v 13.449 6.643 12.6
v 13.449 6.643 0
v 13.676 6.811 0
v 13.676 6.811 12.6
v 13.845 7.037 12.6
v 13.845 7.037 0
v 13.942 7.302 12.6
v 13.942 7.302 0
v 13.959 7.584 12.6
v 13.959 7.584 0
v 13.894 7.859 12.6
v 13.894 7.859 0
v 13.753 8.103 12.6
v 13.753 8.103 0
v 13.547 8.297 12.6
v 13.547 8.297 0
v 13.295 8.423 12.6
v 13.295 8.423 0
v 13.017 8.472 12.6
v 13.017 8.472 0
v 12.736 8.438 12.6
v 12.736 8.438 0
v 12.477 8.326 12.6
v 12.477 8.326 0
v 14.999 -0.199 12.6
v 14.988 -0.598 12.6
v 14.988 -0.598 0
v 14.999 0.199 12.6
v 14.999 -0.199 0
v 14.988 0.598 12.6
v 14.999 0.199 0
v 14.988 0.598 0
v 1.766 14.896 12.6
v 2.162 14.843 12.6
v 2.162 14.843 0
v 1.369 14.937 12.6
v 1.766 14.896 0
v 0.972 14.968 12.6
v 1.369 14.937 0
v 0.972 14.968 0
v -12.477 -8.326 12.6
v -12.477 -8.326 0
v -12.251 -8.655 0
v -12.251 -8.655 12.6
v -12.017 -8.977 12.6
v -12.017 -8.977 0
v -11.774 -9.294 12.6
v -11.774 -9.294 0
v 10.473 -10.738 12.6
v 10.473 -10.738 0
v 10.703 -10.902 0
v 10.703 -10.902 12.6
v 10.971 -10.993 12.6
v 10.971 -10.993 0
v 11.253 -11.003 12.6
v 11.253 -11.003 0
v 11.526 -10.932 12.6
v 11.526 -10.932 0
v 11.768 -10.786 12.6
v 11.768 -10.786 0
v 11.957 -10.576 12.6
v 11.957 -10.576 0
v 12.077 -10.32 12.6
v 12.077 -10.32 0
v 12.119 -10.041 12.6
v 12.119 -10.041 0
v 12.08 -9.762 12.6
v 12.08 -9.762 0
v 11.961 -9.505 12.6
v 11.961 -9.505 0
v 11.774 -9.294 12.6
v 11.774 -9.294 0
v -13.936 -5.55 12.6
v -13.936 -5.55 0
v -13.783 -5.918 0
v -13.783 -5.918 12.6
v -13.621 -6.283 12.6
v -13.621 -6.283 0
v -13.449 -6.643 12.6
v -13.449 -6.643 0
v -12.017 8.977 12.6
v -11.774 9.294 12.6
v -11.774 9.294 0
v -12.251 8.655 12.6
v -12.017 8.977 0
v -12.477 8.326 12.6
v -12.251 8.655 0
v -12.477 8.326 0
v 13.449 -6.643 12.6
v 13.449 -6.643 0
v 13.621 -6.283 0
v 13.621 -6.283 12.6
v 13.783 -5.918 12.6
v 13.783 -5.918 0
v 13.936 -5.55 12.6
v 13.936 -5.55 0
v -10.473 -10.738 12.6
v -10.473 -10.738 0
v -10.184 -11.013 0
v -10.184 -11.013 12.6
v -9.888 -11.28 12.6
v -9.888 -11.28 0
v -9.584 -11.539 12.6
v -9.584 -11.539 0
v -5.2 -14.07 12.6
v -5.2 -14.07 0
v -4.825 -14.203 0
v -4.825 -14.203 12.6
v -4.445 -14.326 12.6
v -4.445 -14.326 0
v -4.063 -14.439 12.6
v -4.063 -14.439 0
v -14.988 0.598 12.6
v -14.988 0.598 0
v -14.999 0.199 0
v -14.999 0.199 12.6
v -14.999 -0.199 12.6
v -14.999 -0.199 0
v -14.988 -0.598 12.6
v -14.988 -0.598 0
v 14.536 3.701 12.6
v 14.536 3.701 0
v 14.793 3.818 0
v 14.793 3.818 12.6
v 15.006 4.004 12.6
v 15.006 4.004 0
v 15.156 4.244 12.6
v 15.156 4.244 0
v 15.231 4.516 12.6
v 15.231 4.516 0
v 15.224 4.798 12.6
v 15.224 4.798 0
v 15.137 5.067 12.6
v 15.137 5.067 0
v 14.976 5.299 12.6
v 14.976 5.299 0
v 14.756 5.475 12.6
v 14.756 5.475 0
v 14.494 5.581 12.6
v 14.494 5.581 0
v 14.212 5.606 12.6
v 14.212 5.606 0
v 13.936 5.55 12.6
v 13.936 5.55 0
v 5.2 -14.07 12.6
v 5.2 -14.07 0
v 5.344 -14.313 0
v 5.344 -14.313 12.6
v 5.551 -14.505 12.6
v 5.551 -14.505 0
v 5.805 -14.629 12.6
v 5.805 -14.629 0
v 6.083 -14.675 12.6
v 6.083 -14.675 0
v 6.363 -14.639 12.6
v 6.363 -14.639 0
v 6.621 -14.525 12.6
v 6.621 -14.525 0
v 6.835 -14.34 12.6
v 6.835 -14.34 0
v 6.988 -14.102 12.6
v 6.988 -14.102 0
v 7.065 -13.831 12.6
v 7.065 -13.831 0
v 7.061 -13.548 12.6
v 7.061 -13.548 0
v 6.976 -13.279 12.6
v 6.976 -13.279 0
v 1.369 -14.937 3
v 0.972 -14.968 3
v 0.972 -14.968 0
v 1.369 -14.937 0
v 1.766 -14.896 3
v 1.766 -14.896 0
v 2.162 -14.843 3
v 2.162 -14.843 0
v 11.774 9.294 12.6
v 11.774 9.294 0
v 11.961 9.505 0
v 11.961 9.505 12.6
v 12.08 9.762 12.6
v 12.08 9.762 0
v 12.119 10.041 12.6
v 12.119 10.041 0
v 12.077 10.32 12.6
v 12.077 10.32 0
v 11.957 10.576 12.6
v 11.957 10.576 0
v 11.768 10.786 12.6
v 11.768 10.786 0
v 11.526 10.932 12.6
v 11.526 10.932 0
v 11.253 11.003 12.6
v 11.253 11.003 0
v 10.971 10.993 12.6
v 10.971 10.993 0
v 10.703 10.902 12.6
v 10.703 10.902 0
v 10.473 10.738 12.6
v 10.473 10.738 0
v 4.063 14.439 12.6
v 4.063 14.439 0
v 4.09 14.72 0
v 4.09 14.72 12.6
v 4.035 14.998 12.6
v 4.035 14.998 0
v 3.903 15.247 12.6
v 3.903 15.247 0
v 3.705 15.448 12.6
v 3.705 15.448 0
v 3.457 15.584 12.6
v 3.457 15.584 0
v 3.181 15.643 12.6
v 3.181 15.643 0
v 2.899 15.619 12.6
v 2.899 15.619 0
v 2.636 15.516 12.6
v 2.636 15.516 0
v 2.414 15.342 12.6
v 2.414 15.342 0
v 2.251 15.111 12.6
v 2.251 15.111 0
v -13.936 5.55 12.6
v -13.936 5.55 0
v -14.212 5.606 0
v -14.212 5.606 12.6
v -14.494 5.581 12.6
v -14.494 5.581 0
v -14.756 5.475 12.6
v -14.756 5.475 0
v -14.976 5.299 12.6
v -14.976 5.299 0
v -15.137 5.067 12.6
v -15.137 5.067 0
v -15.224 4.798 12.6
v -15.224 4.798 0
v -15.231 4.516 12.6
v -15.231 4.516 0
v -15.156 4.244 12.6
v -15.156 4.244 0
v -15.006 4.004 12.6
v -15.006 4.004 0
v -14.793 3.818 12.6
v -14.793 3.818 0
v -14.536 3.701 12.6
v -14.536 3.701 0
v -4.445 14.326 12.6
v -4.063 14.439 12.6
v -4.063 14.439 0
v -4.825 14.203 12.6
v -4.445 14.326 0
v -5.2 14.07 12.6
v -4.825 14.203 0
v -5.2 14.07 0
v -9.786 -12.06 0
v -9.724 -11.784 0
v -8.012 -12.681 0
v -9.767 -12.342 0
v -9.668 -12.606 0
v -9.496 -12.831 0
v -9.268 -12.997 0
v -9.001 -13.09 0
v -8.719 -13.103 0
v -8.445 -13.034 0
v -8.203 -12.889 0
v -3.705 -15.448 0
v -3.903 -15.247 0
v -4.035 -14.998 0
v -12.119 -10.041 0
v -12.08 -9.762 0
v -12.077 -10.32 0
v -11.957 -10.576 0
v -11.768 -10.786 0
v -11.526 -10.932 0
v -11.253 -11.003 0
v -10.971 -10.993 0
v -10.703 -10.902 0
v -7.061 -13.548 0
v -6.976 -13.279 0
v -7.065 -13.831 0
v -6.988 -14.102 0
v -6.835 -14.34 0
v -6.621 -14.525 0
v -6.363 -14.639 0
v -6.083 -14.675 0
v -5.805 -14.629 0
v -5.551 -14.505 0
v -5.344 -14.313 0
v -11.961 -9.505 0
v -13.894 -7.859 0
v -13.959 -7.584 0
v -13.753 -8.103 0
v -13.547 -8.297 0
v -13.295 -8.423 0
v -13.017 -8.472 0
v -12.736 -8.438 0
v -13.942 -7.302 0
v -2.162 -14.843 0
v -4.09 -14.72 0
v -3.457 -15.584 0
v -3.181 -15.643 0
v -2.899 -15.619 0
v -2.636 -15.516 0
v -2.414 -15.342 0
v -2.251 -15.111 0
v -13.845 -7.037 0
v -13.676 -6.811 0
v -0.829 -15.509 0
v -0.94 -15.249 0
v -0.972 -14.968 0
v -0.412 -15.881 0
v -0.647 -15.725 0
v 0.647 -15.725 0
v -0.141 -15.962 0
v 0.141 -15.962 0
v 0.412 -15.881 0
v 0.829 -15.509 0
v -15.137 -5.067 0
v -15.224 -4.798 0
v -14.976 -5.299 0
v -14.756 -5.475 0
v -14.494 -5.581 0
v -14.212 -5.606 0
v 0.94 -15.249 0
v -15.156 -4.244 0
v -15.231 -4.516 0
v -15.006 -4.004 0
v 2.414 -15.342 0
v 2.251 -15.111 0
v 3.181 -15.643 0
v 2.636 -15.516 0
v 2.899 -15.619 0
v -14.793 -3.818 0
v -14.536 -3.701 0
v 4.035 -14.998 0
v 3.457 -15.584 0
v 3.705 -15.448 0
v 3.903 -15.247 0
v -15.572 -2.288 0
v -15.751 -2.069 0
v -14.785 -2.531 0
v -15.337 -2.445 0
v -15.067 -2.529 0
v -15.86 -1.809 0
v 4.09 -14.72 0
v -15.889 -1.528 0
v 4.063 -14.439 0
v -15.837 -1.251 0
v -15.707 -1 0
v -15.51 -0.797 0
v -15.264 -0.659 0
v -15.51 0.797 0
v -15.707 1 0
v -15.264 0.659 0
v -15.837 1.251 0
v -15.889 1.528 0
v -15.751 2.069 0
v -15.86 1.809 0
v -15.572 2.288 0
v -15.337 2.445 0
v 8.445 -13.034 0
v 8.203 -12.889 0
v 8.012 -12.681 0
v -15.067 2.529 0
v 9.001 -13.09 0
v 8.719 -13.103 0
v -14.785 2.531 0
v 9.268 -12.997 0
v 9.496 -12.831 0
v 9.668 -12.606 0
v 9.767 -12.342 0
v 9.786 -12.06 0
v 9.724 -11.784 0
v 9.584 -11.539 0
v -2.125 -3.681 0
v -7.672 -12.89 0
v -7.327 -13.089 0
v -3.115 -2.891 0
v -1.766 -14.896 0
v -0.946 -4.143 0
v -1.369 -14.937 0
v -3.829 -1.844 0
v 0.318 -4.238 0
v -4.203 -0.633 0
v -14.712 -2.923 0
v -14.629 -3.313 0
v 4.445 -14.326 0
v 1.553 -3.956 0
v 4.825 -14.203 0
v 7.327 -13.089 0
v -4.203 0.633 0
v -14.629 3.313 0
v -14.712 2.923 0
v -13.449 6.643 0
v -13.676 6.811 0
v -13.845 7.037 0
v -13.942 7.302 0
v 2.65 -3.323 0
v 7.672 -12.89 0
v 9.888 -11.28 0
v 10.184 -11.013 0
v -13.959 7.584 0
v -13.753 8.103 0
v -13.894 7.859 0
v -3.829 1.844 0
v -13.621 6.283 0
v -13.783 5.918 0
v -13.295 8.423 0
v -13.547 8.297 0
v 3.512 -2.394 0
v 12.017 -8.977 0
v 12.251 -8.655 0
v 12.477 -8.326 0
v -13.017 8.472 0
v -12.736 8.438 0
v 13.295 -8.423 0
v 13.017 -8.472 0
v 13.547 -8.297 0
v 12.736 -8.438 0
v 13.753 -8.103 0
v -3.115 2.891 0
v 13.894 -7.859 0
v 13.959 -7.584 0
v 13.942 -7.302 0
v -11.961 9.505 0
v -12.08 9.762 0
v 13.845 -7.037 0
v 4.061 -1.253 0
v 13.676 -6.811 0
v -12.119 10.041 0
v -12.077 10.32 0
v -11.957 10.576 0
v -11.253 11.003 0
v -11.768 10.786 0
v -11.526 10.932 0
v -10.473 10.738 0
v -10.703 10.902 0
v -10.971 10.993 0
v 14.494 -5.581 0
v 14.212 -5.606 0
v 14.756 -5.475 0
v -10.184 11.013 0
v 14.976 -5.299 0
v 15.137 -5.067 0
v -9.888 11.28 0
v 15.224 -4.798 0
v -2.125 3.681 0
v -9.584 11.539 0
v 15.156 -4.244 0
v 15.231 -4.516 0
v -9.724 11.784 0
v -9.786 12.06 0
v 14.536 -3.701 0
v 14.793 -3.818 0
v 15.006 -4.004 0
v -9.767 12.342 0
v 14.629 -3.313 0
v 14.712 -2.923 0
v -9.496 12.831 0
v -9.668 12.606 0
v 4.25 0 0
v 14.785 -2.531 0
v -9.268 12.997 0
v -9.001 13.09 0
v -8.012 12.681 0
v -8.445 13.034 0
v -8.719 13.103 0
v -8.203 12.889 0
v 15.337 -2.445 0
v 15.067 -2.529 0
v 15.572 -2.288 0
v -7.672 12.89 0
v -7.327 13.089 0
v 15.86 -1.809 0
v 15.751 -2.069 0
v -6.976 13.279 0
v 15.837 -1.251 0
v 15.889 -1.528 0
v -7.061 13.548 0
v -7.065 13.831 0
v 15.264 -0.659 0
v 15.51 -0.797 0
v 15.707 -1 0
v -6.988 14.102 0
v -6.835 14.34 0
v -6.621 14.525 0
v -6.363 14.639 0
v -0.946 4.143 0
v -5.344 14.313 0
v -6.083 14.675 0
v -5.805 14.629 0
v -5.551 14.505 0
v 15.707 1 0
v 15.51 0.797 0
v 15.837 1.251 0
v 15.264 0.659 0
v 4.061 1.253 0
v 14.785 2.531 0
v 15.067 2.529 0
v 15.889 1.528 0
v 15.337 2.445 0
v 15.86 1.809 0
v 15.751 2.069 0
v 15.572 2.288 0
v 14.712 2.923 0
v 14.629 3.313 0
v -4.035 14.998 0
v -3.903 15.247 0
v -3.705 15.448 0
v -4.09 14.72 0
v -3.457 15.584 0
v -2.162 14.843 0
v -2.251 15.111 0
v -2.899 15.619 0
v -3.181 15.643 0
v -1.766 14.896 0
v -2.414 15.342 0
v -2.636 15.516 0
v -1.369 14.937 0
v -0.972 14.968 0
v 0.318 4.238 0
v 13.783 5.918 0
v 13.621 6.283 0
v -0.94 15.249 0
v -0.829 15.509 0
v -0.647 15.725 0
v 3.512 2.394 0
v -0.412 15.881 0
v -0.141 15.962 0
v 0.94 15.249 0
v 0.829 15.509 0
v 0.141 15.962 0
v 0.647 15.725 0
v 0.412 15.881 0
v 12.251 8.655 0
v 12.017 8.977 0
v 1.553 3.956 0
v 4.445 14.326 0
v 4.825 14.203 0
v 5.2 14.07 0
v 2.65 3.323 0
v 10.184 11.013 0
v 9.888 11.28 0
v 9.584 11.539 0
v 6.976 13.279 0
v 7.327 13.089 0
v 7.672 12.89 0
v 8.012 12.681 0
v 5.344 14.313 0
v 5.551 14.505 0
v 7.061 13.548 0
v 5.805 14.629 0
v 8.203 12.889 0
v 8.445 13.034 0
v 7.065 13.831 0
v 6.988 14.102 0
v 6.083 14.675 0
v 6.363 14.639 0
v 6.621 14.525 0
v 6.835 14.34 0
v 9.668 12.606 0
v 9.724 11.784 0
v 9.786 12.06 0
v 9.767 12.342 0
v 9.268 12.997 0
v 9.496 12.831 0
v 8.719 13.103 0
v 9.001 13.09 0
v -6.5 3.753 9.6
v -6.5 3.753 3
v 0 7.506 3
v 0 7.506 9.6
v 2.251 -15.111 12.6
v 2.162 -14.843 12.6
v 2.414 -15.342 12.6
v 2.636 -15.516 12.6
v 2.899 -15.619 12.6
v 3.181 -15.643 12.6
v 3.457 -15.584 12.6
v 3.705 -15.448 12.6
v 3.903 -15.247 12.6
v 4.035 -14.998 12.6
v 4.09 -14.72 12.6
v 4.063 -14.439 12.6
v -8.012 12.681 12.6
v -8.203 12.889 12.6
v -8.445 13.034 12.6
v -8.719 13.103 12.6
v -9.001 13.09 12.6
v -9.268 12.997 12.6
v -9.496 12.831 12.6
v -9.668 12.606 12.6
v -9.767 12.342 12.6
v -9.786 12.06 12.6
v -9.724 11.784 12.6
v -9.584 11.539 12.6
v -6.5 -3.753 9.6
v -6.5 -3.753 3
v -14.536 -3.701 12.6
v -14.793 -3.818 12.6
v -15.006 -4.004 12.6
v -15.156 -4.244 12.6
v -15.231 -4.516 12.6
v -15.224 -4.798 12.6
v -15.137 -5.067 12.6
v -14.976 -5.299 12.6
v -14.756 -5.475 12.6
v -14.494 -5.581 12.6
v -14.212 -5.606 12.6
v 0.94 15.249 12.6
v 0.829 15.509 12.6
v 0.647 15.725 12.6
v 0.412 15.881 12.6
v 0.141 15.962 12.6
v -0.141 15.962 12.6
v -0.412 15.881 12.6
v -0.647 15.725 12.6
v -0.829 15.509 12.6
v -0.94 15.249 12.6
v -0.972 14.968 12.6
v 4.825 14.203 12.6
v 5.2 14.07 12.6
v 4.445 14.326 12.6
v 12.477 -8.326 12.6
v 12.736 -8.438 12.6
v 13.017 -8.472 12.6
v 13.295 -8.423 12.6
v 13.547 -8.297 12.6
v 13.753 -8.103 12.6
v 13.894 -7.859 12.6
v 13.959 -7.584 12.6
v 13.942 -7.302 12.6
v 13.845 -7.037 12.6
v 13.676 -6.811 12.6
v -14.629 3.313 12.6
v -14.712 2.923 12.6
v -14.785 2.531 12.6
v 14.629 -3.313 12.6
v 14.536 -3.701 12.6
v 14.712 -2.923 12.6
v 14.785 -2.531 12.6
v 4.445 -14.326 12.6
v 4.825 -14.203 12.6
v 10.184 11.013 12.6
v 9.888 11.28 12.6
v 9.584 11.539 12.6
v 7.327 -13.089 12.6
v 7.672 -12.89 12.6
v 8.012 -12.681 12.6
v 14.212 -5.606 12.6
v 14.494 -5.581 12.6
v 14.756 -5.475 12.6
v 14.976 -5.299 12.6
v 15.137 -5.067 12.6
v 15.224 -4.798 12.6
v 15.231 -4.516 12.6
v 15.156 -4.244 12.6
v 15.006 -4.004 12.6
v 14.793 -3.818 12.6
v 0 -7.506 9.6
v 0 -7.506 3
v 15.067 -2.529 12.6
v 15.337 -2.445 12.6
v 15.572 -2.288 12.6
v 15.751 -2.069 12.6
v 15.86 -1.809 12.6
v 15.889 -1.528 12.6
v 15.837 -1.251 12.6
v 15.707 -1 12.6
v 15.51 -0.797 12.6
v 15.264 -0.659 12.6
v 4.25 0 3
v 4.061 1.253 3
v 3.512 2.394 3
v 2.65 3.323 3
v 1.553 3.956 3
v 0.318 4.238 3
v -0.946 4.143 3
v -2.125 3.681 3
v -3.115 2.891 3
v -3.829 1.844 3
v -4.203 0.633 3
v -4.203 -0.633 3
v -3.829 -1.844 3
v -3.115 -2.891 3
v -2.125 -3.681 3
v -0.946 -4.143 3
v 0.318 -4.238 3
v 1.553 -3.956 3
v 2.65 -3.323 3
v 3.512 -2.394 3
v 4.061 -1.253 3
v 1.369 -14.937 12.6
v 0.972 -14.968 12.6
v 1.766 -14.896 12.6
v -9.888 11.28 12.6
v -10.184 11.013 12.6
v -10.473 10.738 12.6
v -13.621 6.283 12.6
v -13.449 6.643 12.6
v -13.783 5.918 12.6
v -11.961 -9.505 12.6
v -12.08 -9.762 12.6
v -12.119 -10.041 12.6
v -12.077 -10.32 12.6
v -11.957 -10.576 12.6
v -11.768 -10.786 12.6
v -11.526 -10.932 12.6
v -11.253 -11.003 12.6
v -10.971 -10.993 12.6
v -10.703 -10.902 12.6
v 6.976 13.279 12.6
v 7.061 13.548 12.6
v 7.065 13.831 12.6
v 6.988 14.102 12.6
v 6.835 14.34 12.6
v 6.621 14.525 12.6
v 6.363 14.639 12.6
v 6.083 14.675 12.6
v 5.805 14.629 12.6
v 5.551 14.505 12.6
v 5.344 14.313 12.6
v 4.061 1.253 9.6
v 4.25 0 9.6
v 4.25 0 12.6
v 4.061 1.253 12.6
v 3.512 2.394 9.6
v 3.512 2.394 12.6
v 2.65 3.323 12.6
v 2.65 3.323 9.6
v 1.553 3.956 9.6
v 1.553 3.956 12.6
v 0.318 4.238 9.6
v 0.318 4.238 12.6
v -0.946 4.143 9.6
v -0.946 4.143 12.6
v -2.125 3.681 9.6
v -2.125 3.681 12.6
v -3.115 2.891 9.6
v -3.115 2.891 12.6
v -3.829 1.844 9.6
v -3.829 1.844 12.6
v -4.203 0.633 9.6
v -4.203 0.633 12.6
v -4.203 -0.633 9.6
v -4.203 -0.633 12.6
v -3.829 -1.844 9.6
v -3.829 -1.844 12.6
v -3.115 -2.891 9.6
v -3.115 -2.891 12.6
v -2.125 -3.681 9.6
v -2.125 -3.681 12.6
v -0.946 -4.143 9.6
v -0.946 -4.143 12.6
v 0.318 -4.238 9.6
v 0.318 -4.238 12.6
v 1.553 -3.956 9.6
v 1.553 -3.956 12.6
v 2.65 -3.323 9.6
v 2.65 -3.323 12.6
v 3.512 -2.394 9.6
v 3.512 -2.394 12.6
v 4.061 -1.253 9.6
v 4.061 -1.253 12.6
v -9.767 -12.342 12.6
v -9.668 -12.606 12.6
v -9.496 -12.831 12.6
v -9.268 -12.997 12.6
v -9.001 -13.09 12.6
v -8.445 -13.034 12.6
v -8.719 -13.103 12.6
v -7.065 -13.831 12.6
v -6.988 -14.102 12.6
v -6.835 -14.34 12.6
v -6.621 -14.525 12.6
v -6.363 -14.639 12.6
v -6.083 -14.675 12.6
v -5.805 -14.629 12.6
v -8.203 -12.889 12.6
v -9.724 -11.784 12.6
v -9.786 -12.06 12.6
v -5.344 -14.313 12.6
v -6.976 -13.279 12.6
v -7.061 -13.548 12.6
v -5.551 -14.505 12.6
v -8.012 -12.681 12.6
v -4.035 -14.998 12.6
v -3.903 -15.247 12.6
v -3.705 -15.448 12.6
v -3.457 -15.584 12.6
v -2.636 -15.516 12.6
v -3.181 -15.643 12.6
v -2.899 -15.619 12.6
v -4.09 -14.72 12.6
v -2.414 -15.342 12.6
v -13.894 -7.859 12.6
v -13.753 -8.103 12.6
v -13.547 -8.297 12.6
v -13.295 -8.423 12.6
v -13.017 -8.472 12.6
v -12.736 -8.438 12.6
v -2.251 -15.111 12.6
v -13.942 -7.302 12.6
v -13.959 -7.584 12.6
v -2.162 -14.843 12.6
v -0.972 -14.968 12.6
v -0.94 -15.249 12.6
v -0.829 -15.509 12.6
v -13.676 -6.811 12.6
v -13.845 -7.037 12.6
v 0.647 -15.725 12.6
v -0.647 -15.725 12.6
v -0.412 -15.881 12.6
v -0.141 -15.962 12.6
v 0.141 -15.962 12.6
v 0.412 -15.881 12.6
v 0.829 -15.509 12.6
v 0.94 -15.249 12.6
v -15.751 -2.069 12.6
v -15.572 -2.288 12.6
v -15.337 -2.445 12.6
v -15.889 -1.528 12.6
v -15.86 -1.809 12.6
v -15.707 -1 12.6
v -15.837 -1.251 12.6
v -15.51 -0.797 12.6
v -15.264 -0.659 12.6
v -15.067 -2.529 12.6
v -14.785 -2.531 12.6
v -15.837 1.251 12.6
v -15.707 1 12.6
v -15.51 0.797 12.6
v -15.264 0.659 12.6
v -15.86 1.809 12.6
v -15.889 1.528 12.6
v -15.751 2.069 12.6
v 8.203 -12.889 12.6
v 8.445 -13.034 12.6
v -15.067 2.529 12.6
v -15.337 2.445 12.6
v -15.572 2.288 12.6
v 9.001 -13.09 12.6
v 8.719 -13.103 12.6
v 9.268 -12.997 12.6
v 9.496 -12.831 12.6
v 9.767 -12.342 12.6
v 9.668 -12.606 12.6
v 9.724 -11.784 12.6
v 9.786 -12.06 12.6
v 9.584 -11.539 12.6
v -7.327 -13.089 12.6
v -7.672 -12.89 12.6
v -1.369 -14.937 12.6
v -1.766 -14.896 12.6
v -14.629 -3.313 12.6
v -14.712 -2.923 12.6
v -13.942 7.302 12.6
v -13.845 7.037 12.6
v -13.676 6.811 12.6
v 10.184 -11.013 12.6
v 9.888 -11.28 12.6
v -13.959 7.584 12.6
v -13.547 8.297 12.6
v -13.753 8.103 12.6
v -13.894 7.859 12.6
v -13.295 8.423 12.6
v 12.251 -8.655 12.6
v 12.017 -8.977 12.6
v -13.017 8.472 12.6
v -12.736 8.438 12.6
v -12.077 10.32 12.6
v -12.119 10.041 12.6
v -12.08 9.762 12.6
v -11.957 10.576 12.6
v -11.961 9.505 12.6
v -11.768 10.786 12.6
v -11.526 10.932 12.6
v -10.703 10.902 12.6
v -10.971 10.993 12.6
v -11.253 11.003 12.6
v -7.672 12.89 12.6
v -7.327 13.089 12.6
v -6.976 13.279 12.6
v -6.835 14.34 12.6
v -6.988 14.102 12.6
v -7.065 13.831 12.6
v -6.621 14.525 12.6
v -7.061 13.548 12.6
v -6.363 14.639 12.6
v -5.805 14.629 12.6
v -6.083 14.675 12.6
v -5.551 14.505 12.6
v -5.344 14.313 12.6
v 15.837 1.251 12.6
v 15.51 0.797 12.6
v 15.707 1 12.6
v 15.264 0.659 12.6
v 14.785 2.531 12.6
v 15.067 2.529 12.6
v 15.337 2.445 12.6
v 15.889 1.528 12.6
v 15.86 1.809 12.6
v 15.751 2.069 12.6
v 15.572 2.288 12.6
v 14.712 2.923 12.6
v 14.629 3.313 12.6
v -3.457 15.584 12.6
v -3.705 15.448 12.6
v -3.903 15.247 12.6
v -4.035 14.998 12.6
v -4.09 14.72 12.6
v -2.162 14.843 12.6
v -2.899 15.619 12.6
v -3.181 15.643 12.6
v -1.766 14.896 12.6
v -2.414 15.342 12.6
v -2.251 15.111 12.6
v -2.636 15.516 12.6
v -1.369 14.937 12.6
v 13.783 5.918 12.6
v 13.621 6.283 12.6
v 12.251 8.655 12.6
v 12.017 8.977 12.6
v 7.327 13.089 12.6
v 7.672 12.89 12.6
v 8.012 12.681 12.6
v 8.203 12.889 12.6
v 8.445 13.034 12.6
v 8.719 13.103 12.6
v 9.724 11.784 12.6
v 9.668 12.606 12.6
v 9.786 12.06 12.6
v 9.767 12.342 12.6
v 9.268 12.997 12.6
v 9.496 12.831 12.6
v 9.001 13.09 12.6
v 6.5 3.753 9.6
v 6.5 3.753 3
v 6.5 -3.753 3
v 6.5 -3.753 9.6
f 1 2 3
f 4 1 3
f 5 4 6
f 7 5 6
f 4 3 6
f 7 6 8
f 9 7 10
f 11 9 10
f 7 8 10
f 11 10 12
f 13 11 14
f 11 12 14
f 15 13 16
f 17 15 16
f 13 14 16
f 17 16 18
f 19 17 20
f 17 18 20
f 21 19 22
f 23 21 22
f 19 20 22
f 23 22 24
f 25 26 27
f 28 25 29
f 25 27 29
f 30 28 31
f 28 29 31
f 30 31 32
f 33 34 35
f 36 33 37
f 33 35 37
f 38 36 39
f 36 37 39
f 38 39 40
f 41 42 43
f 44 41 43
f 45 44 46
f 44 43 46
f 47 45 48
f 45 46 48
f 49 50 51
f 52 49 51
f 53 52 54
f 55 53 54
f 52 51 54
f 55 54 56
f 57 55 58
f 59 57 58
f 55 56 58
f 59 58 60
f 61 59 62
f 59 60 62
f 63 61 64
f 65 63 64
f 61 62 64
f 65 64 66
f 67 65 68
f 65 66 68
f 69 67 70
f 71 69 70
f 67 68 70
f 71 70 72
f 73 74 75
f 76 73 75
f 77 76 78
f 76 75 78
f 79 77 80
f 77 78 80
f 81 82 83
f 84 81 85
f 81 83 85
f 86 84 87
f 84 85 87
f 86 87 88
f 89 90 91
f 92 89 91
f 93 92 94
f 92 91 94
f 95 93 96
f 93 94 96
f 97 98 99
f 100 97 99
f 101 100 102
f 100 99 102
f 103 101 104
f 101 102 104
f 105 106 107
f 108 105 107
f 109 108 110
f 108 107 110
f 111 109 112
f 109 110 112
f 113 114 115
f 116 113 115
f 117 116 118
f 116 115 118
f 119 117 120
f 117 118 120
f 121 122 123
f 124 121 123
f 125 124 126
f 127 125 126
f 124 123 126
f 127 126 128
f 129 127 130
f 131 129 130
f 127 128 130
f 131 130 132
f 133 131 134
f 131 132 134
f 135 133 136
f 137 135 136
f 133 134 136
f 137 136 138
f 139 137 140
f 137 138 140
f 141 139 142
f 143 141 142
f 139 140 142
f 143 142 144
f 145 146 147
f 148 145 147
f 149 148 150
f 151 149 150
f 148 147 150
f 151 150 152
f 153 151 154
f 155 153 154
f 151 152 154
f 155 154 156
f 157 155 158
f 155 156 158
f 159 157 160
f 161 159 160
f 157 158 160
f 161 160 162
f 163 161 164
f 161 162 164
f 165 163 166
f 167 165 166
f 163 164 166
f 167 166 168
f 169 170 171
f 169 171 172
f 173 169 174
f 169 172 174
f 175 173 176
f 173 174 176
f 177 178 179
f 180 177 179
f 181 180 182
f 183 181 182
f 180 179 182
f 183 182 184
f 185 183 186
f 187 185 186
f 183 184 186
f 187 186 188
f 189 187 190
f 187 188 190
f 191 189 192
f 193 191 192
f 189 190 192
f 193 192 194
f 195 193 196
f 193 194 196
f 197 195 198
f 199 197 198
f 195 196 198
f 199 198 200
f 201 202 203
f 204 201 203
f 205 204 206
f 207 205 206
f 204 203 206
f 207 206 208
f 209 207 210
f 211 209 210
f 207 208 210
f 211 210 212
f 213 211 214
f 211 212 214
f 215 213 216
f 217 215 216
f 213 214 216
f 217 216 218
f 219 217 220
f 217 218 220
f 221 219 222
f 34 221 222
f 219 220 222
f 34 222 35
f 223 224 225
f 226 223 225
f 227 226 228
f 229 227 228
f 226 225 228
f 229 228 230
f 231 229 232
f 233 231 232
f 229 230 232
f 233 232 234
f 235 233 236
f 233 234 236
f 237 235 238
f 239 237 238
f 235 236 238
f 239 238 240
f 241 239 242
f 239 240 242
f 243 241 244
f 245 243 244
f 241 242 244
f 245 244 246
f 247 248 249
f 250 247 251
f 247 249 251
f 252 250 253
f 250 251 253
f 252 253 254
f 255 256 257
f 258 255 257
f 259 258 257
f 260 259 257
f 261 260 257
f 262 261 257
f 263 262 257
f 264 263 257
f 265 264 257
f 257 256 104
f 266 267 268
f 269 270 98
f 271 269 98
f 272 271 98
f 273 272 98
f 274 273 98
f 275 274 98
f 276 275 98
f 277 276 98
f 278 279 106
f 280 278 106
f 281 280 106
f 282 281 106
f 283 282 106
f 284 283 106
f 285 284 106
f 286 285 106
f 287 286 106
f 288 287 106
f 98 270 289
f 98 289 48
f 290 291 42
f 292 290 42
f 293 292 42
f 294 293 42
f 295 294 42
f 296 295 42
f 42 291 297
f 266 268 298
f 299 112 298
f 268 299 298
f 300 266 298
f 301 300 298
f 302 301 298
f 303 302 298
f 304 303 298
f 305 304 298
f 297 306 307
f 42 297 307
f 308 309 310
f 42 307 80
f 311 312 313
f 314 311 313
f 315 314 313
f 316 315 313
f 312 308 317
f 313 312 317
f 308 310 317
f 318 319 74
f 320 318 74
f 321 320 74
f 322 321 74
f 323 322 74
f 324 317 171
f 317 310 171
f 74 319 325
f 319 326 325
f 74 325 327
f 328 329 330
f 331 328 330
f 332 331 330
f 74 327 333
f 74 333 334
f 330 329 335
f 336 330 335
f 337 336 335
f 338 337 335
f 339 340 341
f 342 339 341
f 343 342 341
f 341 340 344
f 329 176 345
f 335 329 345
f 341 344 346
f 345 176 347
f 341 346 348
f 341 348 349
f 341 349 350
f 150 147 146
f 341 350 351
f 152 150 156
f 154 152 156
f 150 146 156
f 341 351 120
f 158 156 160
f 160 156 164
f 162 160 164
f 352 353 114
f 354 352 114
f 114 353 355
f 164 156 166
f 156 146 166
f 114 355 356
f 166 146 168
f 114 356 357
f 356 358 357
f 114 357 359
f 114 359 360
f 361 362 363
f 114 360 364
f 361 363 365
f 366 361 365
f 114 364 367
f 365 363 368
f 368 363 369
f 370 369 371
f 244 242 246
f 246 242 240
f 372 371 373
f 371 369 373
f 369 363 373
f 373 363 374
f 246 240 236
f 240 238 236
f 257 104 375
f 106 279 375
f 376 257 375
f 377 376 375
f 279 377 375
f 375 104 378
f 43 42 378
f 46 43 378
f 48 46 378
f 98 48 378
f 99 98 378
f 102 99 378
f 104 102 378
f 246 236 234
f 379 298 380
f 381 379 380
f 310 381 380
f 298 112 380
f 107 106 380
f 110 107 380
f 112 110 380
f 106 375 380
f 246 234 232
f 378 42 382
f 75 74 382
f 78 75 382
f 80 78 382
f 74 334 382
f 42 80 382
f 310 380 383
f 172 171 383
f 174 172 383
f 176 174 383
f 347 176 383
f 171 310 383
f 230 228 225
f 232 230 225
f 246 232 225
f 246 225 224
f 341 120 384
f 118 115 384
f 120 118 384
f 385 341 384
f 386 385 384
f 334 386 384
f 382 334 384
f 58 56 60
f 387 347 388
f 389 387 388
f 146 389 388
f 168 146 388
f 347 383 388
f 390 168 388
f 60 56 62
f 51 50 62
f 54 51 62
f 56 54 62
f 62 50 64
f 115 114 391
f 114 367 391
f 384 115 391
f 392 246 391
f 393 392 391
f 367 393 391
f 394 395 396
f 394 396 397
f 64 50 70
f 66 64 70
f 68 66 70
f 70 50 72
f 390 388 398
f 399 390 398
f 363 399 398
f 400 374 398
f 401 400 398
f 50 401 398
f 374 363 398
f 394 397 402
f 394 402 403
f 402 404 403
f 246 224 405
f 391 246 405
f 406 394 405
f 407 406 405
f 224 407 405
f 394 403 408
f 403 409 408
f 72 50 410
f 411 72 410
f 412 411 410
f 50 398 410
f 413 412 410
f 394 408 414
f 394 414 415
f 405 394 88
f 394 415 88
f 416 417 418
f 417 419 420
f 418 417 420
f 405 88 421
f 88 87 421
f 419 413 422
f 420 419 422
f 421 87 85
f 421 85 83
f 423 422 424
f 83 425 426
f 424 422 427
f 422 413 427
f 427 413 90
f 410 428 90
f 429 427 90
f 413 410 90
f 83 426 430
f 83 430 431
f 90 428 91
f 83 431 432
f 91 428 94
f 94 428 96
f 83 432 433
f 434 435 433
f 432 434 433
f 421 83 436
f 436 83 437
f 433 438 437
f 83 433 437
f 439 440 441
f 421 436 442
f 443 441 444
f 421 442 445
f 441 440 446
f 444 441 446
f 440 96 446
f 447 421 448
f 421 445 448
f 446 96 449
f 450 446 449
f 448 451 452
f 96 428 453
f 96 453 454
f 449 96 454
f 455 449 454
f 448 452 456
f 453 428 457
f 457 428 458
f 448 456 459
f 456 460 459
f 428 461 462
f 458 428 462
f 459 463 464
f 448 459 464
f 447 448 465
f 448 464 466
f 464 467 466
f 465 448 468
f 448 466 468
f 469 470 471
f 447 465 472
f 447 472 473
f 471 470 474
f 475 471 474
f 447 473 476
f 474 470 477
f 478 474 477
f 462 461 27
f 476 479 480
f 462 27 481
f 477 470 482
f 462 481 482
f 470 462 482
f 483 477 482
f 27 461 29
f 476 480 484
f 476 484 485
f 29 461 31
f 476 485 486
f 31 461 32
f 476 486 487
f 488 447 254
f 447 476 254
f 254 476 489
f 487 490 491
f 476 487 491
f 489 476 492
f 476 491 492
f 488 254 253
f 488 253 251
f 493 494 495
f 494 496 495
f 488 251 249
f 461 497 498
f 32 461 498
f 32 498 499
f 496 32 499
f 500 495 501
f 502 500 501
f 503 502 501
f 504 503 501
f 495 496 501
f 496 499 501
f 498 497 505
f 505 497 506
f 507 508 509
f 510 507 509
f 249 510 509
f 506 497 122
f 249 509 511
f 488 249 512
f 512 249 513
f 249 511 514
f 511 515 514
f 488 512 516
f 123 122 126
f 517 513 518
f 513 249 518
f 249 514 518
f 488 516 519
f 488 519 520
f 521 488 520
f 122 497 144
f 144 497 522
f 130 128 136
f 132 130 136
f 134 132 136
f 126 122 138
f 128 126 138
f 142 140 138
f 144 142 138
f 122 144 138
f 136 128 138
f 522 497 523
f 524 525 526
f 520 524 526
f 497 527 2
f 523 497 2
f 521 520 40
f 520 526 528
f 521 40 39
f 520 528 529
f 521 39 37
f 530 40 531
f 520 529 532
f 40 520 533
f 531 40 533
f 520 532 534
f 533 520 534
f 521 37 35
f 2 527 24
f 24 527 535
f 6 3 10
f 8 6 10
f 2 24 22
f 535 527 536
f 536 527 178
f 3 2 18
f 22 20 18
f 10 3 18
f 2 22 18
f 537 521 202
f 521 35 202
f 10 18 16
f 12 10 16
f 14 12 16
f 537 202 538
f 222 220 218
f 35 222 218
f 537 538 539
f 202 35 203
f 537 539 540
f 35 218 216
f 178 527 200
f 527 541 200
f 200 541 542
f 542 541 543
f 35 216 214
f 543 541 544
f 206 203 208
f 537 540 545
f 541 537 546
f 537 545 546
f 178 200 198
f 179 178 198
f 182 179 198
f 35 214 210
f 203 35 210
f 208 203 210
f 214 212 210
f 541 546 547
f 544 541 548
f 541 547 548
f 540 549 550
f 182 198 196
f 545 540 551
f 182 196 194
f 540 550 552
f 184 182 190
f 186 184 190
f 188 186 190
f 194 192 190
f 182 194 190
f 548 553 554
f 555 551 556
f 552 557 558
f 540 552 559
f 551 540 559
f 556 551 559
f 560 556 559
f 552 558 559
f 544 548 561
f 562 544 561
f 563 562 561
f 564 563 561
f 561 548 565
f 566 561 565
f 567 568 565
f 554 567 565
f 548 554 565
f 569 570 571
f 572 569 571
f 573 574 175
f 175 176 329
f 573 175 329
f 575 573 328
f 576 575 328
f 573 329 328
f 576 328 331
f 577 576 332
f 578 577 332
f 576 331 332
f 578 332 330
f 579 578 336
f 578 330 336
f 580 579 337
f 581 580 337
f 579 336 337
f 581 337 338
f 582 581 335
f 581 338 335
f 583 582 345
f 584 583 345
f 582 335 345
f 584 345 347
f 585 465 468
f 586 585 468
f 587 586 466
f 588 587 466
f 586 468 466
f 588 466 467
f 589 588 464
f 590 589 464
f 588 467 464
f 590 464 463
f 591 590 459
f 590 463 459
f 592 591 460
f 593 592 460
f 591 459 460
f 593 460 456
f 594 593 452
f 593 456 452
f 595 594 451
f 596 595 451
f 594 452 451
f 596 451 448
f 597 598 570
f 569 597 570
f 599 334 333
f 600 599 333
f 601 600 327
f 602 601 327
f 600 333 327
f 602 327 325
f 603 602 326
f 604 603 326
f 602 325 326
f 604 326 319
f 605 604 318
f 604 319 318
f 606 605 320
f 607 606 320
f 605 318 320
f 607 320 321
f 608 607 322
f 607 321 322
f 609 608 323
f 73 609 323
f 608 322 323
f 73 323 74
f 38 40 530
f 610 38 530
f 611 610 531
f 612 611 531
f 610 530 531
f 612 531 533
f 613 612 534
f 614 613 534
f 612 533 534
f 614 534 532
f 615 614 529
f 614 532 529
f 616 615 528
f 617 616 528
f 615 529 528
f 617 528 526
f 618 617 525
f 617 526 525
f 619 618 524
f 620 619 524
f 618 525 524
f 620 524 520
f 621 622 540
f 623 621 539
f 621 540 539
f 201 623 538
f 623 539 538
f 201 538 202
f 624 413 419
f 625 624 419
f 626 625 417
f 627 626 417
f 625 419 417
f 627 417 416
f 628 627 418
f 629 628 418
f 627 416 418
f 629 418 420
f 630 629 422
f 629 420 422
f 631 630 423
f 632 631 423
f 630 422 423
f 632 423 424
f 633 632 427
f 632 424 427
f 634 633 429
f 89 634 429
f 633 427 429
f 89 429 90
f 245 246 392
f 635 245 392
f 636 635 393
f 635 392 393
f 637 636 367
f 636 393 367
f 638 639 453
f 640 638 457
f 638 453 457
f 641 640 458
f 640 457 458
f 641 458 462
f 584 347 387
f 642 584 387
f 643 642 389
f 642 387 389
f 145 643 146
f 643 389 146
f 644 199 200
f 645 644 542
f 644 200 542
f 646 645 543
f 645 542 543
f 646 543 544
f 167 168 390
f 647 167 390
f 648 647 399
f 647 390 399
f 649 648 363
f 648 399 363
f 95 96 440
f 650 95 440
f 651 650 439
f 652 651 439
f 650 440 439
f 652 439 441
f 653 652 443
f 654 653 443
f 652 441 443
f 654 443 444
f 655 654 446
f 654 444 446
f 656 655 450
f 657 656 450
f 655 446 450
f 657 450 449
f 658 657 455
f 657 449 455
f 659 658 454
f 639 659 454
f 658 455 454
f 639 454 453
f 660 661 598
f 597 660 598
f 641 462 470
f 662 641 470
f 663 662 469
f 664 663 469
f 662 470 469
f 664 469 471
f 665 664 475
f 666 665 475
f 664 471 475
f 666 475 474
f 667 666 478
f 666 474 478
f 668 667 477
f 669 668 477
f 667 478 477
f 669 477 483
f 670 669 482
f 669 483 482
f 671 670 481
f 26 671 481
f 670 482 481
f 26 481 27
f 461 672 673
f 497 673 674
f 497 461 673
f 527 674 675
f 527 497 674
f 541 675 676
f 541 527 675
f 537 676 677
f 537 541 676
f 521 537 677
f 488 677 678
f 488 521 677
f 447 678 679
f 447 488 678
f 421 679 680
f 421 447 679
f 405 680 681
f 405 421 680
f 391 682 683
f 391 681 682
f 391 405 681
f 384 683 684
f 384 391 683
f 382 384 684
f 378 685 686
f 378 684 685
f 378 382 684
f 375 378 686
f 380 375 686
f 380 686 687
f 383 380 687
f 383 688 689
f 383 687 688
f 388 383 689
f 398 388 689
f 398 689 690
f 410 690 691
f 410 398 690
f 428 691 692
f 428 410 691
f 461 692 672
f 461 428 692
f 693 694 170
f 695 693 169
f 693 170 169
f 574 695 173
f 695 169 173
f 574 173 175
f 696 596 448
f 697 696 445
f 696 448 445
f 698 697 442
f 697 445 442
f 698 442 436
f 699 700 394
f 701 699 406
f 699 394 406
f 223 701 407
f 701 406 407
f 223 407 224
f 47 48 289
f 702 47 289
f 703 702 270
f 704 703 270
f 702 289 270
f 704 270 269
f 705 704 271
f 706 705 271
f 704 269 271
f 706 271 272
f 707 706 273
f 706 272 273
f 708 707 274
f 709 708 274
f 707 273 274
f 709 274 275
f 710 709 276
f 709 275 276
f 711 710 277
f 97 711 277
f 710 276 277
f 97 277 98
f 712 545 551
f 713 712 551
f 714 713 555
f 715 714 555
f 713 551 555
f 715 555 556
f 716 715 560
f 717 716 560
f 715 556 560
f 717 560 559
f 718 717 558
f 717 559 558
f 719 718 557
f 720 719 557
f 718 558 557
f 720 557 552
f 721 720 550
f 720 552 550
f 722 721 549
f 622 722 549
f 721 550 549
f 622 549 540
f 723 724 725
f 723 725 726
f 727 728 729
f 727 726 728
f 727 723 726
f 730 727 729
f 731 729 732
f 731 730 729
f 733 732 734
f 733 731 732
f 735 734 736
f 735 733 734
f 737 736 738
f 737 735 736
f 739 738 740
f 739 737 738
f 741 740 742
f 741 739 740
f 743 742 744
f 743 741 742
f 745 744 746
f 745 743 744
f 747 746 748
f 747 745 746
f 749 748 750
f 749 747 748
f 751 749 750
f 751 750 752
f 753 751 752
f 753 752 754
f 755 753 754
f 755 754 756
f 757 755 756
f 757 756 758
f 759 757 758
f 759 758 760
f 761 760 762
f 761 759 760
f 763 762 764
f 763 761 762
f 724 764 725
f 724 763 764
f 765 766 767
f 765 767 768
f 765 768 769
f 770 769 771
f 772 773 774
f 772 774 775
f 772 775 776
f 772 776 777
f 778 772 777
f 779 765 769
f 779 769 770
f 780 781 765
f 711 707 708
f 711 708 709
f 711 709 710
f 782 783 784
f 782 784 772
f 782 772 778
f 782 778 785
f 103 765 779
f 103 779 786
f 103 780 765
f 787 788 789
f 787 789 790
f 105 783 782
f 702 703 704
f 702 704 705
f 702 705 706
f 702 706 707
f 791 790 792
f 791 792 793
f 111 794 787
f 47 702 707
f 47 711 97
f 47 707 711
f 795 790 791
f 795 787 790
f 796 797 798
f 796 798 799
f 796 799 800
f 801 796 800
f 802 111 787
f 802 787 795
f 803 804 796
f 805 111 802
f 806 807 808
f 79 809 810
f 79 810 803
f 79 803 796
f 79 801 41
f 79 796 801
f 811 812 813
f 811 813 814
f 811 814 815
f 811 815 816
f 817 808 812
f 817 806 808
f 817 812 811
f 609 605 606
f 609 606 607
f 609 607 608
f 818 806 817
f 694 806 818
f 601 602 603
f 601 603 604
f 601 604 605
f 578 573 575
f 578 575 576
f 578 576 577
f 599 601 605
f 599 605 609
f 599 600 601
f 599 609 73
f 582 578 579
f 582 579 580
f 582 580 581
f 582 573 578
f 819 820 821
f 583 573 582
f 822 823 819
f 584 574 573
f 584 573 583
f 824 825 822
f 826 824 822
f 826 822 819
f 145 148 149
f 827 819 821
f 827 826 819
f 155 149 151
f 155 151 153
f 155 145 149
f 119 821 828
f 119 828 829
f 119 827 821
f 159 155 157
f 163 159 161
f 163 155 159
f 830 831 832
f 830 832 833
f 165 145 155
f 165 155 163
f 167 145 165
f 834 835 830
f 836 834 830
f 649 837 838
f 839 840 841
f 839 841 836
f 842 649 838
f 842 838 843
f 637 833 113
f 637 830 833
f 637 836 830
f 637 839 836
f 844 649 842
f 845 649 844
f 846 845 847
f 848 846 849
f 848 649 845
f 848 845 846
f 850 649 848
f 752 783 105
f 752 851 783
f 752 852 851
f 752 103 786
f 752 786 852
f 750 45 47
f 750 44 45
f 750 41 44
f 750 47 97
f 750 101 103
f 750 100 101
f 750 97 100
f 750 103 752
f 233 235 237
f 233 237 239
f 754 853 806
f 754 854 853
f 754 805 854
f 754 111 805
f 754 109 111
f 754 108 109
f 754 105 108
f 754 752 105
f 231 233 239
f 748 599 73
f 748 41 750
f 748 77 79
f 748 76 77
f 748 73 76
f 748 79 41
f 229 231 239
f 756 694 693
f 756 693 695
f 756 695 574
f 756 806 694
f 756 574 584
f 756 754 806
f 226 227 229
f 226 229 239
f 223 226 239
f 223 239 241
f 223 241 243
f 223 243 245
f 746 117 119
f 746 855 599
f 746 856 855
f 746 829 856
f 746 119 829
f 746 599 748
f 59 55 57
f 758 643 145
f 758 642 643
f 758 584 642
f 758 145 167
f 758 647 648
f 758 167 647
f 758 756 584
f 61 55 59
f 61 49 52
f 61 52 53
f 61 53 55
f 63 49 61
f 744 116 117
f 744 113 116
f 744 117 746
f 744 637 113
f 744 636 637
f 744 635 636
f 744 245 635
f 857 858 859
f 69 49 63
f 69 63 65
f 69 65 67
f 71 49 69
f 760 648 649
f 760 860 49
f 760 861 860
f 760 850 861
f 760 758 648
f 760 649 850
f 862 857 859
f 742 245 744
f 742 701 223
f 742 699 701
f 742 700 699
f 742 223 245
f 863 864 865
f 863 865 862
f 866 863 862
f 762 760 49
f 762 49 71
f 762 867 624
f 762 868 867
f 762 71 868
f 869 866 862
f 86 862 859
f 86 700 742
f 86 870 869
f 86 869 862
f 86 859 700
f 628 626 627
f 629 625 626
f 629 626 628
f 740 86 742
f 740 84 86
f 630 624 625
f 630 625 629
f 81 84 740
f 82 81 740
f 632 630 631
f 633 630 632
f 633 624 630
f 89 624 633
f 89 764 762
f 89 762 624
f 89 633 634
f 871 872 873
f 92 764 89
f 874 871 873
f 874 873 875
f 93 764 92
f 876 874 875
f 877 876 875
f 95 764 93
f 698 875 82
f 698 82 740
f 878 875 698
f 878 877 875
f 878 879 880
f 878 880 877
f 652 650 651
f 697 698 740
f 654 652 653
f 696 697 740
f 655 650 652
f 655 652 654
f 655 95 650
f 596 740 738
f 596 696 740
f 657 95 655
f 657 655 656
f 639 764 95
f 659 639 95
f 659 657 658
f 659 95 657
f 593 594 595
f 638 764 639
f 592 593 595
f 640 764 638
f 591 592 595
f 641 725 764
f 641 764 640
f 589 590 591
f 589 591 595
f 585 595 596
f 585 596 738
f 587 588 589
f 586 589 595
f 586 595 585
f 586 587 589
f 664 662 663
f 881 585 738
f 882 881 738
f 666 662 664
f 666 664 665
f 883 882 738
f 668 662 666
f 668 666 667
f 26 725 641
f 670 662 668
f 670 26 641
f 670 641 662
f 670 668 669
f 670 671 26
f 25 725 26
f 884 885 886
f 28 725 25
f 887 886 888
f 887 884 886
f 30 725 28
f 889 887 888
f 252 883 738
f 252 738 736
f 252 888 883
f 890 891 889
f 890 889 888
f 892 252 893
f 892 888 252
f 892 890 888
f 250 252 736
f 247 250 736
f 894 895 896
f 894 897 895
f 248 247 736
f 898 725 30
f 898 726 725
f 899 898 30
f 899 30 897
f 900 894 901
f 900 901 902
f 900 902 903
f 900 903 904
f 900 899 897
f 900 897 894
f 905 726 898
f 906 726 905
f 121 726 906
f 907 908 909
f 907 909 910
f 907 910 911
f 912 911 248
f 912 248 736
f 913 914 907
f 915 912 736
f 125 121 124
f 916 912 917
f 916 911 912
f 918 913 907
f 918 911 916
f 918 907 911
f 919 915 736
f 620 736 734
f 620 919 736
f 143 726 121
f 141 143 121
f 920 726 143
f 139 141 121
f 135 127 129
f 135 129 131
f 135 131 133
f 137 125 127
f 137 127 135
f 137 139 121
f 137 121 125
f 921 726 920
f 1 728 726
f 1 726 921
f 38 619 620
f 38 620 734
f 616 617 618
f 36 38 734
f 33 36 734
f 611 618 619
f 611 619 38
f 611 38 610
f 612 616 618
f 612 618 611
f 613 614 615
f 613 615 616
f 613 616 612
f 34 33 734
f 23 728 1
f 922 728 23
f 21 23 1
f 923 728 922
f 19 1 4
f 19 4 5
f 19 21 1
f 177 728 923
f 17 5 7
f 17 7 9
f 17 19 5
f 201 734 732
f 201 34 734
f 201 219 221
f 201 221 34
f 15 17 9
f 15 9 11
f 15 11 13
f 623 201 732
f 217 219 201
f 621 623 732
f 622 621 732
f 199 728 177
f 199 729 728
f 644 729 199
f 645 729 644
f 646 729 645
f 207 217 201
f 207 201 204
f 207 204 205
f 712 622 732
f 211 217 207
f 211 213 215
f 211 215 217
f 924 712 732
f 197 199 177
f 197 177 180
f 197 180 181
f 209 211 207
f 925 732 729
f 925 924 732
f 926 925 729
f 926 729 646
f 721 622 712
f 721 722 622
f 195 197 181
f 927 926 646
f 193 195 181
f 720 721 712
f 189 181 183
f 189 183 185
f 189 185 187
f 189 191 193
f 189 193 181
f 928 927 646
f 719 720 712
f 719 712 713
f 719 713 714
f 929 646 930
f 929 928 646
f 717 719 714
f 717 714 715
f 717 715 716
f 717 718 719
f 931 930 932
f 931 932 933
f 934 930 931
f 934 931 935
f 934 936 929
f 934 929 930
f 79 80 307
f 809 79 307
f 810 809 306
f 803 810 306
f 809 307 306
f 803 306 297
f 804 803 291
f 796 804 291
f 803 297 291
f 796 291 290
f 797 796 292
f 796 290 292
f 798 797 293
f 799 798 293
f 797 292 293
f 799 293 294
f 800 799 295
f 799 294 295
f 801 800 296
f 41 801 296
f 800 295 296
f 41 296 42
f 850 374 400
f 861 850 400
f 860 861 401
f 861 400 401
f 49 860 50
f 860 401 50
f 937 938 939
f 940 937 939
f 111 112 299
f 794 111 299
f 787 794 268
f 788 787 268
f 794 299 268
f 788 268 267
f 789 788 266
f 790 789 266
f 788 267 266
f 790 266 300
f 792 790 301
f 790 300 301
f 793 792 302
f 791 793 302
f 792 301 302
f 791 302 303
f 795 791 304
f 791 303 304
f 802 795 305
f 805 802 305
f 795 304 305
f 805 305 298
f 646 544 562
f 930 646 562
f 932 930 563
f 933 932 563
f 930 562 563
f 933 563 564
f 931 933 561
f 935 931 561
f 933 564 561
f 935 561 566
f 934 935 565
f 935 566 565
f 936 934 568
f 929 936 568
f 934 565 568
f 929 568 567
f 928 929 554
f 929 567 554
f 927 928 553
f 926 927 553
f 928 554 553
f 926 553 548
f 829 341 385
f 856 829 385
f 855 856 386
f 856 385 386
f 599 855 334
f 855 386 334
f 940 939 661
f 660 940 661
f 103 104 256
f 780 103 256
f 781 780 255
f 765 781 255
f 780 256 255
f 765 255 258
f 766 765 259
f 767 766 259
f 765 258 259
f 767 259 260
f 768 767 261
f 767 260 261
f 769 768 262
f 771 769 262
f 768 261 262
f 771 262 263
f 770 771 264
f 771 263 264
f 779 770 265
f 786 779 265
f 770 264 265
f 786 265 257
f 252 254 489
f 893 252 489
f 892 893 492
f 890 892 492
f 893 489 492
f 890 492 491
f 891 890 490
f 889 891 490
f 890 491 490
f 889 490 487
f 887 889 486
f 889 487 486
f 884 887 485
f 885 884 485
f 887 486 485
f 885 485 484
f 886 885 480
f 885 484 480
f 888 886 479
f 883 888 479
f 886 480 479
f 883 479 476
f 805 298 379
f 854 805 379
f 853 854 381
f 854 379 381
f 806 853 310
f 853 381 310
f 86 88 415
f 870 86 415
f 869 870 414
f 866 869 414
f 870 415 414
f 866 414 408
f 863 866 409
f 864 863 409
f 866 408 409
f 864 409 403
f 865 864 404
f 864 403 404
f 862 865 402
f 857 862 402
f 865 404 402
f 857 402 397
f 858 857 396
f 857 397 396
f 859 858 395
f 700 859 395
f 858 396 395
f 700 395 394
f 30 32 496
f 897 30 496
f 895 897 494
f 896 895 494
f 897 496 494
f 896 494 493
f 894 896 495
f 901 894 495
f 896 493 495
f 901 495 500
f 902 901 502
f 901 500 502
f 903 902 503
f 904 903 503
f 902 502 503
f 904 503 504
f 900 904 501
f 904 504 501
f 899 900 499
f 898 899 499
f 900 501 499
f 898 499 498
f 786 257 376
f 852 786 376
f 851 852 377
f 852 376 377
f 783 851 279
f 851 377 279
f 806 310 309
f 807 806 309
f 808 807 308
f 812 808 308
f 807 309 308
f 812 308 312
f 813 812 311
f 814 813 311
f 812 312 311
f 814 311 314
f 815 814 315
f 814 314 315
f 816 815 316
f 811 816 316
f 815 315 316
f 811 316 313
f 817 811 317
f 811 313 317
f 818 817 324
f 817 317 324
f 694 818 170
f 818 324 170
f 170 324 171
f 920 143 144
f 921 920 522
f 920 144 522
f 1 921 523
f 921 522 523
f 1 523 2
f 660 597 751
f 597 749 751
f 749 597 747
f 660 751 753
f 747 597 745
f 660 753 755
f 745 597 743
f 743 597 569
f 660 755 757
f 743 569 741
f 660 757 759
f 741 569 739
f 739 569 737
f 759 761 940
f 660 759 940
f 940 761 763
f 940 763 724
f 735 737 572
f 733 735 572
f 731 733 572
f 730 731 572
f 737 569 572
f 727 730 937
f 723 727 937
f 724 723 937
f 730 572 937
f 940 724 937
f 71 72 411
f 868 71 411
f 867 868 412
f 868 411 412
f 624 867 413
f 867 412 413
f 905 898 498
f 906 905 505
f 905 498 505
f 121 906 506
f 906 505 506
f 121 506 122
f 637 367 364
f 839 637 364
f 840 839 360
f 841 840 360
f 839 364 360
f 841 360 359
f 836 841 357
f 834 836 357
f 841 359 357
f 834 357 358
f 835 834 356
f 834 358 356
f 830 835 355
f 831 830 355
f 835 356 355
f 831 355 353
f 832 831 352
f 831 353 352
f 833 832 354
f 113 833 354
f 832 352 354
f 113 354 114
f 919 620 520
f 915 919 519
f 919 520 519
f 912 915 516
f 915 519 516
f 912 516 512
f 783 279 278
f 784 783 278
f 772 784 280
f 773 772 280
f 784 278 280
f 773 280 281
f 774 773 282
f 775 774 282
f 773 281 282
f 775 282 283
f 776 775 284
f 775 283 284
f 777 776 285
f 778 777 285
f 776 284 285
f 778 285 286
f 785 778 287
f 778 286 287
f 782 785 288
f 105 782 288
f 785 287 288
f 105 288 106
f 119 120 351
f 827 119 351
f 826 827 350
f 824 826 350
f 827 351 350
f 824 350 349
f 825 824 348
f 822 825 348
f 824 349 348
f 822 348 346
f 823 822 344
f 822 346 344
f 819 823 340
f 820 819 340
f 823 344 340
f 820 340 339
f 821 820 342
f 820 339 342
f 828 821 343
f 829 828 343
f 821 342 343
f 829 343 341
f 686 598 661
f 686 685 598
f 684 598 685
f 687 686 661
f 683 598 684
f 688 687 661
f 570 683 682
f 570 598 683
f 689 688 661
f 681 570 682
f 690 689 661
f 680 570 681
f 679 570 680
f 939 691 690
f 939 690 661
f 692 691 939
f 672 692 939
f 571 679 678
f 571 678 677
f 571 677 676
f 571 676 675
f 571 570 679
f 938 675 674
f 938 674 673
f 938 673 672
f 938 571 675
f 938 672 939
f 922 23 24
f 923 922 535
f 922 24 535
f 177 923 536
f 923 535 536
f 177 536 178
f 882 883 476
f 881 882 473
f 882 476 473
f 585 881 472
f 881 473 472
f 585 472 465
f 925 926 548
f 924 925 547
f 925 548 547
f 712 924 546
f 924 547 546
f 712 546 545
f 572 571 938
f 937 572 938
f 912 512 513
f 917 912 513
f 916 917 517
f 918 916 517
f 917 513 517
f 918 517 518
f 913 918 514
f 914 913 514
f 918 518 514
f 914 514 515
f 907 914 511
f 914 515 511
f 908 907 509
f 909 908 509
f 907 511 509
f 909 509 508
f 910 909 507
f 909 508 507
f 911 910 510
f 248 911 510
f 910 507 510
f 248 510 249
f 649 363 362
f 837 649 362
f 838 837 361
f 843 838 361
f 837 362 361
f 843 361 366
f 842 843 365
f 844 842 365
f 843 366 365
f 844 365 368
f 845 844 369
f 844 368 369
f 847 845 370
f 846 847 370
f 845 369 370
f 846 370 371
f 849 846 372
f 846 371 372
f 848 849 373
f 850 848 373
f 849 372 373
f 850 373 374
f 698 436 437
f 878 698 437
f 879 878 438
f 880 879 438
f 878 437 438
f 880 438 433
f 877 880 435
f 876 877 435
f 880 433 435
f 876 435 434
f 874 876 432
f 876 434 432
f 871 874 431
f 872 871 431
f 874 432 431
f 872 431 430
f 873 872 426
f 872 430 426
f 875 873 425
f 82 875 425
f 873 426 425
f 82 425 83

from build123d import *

# Parameters (mm, degrees)
F0_R     = 4.25
F1_DEPTH = 3
F2_R     = 15
F3_DEPTH = 6.6
F4_R     = 15
F5_DEPTH = 3
F6_DEPTH = 12.6
F7_COUNT = 30
F8_DEPTH = 25


with BuildPart() as f1:
    # F0 (on Top) → F1 (new body)
    with BuildSketch(Plane.XY):
        with BuildLine():
            ThreePointArc((0.9718013796, -14.9684869669), (10.9447937553, -10.2572652132), (15, 0))
            ThreePointArc((15, 0), (-10.2572652132, 10.9447937553), (-0.9718013796, -14.9684869669))
            ThreePointArc((-0.9718013796, -14.9684869669), (0, -15), (0.9718013796, -14.9684869669))
        make_face()
        Polygon((0, 7.5055534995), (6.5, 3.7527767497), (6.5, -3.7527767497), (0, -7.5055534995), (-6.5, -3.7527767497), (-6.5, 3.7527767497), align=None, mode=Mode.SUBTRACT)
        Polygon((6.5, -3.7527767497), (6.5, 3.7527767497), (0, 7.5055534995), (-6.5, 3.7527767497), (-6.5, -3.7527767497), (0, -7.5055534995), align=None)
        Circle(F0_R, mode=Mode.SUBTRACT)
        Circle(F0_R)
    extrude(amount=F1_DEPTH)

    # F2 (on face) → F3 (join)
    with BuildSketch(Plane.XY.offset(3)):
        Circle(F2_R)
        Polygon((-6.5, -3.7527767497), (-6.5, 3.7527767497), (0, 7.5055534995), (6.5, 3.7527767497), (6.5, -3.7527767497), (0, -7.5055534995), align=None, mode=Mode.SUBTRACT)
    extrude(amount=F3_DEPTH)

    # F4 (on face) → F5 (join)
    with BuildSketch(Plane.XY.offset(9.6)):
        Circle(F4_R)
        Polygon((6.5, -3.7527767497), (0, -7.5055534995), (-6.5, -3.7527767497), (-6.5, 3.7527767497), (0, 7.5055534995), (6.5, 3.7527767497), align=None, mode=Mode.SUBTRACT)
        Polygon((-6.5, -3.7527767497), (0, -7.5055534995), (6.5, -3.7527767497), (6.5, 3.7527767497), (0, 7.5055534995), (-6.5, 3.7527767497), align=None)
    extrude(amount=F5_DEPTH)



with BuildPart() as f6:
    # F0 (on Top) → F6 (new body, through all)
    with BuildSketch(Plane.XY):
        with BuildLine():
            ThreePointArc((0.9718013796, -14.9684869669), (0, -15), (-0.9718013796, -14.9684869669))
            ThreePointArc((-0.9718013796, -14.9684869669), (0, -15.9723121888), (0.9718013796, -14.9684869669))
        make_face()
    extrude(amount=F6_DEPTH)


with BuildPart() as f1_1:
    add(f1.part)

    add(f6.part)  # F7 merges F6
    # F7: F6 ×30 about axis
    f7_axis = Axis((0, 0, 0), (0, 0, 1))
    for i in range(1, F7_COUNT):
        add(f6.part.rotate(f7_axis, i * 360 / F7_COUNT))

    # F0 (on Top) → F8 (cut)
    with BuildSketch(Plane.XY):
        Circle(F0_R)
    extrude(amount=F8_DEPTH, mode=Mode.SUBTRACT)


solid = f1_1.part
